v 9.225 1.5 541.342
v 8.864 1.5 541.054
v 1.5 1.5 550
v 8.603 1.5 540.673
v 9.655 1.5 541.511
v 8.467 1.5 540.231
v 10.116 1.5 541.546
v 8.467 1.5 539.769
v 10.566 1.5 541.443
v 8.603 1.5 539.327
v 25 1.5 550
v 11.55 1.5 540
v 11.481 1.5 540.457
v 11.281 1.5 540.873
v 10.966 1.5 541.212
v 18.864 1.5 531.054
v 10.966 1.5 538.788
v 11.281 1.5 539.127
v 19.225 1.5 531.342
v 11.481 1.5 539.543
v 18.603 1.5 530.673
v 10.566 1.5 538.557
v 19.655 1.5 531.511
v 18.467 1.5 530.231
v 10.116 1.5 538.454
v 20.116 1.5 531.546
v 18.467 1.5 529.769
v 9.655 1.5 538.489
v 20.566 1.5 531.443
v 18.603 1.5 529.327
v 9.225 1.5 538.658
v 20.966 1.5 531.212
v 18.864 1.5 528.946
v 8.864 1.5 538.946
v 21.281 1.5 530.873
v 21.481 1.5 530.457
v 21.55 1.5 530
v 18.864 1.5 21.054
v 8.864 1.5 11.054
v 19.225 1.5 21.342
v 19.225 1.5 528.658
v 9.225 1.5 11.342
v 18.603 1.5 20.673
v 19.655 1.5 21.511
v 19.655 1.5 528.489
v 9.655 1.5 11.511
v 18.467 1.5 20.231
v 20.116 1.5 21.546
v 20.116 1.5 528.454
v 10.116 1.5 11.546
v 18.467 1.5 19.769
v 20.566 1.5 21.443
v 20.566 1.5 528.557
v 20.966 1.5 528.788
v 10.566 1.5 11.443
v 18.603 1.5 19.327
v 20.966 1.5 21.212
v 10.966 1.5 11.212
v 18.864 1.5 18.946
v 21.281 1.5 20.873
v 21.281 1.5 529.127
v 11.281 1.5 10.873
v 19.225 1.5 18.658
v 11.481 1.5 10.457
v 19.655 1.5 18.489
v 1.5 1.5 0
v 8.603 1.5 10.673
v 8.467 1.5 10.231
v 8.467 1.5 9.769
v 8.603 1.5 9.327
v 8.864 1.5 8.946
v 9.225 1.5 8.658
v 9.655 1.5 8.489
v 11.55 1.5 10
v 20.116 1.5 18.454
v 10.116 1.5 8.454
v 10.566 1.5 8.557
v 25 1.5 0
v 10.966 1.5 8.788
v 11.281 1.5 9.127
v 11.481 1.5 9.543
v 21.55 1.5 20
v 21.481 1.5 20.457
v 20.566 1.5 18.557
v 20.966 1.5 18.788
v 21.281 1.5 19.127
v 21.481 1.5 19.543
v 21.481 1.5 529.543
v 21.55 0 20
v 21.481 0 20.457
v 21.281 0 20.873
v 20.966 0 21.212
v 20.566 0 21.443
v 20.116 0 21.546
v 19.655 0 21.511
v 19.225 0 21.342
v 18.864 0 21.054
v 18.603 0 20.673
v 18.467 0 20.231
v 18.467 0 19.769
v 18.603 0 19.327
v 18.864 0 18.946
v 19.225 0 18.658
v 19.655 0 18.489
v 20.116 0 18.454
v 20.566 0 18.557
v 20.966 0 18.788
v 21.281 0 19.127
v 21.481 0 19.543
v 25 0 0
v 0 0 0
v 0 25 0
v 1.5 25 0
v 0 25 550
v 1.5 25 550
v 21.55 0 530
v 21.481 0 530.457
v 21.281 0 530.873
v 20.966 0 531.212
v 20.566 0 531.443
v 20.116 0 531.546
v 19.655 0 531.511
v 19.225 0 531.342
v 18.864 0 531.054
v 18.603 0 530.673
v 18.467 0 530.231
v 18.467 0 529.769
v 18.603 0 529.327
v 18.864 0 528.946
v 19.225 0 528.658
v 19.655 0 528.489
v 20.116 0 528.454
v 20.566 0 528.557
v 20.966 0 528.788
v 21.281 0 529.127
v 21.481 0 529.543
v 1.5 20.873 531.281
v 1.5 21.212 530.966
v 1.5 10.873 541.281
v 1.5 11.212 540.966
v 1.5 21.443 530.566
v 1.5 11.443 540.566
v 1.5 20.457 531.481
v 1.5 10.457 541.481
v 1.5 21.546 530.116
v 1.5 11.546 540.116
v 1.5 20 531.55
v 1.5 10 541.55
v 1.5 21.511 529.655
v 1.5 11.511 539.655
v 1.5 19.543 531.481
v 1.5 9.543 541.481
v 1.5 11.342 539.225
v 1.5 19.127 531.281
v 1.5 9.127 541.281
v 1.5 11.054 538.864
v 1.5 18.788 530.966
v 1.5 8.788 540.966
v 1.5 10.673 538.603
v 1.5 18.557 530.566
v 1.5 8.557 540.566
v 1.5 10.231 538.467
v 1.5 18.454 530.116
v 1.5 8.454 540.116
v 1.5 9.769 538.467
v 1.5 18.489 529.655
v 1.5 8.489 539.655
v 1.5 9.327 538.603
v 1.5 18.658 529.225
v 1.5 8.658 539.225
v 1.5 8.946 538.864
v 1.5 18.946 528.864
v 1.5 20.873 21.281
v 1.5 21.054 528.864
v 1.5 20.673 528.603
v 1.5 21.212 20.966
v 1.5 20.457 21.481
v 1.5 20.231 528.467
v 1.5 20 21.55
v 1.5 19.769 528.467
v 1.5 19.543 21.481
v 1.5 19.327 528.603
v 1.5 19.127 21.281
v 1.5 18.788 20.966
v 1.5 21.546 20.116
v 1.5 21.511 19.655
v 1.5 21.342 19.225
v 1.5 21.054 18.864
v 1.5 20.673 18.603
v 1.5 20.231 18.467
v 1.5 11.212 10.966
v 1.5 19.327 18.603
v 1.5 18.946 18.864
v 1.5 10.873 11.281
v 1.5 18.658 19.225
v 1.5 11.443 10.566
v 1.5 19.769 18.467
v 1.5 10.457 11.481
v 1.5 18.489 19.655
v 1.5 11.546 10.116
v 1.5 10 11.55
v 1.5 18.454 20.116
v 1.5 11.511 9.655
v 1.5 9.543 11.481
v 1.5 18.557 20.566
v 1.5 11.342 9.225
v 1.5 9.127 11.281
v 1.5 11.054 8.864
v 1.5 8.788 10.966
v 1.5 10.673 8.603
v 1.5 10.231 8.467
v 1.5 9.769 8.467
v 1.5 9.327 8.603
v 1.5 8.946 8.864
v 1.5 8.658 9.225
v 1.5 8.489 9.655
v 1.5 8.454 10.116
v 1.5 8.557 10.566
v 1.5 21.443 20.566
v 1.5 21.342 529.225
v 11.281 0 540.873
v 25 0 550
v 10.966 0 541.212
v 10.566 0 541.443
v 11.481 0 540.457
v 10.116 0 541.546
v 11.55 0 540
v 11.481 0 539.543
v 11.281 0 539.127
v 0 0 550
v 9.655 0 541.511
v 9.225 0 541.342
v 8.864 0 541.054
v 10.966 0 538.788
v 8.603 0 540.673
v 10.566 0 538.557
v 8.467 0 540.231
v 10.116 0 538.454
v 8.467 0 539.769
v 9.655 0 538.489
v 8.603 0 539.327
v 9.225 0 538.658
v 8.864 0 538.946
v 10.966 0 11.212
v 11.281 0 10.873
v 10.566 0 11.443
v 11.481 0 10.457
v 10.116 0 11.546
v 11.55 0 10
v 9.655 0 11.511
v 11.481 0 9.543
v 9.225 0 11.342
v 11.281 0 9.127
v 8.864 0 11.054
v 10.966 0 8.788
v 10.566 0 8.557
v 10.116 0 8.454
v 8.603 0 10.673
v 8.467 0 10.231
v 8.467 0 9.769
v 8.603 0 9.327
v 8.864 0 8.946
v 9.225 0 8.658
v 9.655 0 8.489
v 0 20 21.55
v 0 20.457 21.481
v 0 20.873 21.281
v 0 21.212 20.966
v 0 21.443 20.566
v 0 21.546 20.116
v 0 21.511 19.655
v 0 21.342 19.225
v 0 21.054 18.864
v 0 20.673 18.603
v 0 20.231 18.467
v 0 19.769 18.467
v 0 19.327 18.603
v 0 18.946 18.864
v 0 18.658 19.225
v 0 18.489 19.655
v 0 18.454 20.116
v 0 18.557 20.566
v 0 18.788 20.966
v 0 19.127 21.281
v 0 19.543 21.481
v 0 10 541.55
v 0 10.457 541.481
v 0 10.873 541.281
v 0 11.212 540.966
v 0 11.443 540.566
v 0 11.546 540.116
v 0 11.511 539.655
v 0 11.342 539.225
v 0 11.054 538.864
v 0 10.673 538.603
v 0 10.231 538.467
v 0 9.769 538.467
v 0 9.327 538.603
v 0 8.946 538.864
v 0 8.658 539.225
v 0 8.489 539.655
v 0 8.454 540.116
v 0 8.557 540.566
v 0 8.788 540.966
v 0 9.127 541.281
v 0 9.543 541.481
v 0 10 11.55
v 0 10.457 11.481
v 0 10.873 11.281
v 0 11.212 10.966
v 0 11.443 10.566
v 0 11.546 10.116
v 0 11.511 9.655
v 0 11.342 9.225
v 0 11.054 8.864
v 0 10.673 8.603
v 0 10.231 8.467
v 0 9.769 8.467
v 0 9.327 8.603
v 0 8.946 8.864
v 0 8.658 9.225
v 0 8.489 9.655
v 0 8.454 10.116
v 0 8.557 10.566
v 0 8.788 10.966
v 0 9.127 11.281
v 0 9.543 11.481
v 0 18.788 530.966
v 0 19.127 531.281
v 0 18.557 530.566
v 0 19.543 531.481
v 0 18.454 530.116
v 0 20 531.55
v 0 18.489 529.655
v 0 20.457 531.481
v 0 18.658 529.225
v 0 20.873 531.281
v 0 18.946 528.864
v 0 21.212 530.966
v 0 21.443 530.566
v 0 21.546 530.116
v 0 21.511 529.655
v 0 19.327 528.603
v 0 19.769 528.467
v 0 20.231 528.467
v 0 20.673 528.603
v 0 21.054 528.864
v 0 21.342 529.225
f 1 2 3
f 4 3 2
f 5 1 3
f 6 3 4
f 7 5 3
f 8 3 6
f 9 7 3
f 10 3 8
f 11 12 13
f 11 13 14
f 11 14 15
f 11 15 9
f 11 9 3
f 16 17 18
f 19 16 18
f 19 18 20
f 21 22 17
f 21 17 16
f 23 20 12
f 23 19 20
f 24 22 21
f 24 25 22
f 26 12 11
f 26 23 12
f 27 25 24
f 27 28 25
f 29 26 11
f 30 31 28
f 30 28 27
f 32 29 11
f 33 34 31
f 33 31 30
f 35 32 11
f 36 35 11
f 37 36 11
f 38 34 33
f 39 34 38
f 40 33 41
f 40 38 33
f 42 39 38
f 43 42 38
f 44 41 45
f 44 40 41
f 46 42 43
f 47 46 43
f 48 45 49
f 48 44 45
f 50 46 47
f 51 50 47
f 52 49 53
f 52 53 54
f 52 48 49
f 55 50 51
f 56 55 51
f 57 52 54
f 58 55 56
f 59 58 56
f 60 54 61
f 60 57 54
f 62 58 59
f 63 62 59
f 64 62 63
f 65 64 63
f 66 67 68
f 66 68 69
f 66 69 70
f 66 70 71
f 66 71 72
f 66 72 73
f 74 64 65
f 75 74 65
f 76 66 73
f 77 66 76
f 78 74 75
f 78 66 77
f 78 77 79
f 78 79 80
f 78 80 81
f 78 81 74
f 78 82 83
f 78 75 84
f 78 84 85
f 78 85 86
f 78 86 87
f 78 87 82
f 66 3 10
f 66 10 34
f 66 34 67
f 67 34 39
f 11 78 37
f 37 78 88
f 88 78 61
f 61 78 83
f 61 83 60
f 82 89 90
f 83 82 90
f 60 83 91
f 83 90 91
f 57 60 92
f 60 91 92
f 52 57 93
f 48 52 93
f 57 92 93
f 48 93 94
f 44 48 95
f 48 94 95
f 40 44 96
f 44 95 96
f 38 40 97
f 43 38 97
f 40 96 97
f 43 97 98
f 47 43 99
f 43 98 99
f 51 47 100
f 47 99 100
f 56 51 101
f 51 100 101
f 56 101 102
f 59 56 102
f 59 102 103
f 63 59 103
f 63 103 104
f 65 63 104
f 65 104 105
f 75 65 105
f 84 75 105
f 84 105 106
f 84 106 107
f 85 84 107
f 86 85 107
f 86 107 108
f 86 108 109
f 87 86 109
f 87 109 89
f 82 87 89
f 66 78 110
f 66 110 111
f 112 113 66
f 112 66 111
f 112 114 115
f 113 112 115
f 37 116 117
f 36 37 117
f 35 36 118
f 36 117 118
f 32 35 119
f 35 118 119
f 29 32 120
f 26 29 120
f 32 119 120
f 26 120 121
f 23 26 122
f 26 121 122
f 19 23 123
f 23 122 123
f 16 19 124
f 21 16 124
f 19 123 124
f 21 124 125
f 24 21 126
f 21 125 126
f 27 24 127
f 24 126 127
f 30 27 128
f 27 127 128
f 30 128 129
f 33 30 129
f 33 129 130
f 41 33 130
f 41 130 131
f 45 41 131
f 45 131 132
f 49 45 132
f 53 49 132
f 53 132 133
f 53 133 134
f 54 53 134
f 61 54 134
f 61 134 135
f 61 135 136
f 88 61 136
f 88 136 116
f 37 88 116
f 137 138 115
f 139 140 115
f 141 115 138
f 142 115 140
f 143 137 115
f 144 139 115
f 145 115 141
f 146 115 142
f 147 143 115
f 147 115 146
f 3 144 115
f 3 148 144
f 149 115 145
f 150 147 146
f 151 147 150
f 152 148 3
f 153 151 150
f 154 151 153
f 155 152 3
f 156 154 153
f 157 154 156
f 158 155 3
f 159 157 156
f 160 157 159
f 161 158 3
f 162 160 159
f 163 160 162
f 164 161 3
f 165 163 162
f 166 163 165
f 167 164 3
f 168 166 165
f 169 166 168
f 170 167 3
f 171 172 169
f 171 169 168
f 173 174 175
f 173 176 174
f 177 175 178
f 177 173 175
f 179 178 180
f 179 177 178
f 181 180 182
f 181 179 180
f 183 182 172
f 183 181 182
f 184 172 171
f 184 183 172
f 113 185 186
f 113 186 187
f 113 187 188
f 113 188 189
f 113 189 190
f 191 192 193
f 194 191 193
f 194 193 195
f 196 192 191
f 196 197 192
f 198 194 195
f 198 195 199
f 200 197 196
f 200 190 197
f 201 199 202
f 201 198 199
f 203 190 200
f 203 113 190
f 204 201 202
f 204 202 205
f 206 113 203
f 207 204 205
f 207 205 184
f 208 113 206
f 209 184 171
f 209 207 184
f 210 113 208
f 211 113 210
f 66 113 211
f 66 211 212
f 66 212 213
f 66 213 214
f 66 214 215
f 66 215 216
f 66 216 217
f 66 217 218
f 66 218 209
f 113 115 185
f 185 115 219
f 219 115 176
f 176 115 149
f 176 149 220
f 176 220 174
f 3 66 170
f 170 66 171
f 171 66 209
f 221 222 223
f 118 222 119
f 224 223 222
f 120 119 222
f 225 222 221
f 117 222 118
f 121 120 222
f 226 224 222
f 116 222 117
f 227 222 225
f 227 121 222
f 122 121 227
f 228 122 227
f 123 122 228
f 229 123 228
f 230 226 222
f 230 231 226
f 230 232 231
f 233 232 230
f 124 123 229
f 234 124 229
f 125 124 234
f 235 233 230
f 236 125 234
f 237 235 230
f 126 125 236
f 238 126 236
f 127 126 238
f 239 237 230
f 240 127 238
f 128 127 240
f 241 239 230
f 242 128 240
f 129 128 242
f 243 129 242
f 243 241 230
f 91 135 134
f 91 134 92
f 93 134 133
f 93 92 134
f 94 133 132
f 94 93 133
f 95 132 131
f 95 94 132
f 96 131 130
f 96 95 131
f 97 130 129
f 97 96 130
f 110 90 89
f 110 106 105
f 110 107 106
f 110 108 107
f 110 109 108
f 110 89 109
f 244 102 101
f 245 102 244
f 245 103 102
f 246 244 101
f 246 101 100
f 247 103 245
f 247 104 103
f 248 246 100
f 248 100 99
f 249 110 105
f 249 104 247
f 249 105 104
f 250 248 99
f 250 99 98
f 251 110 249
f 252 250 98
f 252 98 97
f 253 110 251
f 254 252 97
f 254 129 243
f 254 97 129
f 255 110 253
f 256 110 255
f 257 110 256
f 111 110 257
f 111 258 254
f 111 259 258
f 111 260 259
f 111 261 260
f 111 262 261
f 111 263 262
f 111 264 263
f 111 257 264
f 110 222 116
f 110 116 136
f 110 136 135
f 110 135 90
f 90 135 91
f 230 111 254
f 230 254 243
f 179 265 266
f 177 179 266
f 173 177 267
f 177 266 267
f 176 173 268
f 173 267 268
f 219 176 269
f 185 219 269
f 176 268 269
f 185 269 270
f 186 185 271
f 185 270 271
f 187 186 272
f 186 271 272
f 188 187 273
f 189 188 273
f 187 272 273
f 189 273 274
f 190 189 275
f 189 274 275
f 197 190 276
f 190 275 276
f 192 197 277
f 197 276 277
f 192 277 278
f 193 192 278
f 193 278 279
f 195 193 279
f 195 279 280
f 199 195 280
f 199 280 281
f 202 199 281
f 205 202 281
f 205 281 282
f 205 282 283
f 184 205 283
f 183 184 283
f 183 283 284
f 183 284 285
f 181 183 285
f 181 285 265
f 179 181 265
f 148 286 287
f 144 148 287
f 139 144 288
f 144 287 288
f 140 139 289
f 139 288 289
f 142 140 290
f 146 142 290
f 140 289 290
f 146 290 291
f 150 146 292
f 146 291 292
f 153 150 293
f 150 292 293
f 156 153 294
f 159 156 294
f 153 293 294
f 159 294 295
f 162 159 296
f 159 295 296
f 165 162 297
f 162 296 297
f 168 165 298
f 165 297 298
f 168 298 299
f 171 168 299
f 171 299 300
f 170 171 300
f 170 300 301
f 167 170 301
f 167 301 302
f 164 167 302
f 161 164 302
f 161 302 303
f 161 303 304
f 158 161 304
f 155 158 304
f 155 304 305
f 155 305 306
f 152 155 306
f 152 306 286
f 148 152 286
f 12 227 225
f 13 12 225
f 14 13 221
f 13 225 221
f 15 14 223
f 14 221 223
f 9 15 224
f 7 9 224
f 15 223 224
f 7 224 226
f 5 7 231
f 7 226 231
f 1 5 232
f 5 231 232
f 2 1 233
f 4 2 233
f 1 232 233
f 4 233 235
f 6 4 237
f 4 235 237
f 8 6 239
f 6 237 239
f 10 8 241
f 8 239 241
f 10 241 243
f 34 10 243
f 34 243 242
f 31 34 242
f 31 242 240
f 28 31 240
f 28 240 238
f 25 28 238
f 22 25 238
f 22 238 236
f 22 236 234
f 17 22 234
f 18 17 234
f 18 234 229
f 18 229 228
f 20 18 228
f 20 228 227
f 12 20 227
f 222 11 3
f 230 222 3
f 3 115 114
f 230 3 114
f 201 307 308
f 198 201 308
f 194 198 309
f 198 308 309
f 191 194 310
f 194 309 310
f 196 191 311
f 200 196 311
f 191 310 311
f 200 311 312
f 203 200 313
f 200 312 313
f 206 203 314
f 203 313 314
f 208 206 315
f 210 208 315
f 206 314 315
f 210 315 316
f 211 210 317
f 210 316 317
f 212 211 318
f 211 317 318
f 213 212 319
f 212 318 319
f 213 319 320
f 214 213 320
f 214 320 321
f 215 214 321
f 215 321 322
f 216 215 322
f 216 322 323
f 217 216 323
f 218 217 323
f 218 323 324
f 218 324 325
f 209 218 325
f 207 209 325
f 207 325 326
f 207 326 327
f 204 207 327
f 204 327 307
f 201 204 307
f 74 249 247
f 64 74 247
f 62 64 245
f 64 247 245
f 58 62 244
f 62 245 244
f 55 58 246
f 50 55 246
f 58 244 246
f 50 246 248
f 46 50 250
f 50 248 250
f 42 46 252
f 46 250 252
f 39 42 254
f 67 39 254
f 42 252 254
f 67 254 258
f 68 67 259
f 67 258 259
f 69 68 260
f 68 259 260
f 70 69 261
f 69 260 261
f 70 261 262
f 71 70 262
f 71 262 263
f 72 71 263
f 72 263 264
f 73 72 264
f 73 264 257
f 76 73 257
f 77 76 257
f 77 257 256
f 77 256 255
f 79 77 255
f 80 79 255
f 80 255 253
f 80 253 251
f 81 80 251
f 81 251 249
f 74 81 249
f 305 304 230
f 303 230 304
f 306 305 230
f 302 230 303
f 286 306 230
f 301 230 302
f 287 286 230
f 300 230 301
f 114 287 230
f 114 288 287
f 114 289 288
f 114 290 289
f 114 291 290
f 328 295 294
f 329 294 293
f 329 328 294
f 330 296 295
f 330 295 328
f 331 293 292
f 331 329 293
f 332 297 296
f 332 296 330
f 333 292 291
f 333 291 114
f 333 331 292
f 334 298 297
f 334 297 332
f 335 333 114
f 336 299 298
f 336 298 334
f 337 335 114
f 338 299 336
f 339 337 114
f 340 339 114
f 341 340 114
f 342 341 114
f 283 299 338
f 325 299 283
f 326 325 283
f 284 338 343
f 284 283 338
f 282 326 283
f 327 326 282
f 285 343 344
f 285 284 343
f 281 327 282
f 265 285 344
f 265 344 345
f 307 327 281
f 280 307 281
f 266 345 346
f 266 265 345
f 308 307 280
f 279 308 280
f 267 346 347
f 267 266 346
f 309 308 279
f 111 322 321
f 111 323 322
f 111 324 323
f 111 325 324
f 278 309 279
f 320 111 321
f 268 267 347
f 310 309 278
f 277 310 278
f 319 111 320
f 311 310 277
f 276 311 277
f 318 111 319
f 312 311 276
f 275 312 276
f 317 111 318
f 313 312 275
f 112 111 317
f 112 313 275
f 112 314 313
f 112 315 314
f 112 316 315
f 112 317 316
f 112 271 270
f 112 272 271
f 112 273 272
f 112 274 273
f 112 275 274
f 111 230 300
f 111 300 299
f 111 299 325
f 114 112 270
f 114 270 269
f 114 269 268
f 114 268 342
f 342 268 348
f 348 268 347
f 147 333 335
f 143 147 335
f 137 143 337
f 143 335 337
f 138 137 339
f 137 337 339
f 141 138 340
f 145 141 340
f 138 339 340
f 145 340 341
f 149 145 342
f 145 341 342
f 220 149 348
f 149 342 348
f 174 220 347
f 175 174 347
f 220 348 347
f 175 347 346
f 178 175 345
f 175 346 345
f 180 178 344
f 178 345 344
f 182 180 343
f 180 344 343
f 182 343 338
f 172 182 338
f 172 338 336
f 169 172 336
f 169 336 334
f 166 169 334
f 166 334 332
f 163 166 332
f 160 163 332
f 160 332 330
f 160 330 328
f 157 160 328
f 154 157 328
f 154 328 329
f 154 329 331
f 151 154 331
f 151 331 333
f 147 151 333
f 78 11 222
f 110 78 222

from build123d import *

# Parameters (mm, degrees)
BOSS_EXTRUDE1_DEPTH = 550
SKETCH2_R           = 1.55
CUT_EXTRUDE1_DEPTH  = 10
SKETCH3_R           = 1.55
CUT_EXTRUDE2_DEPTH  = 10


with BuildPart() as part:
    # Sketch1 → Boss-Extrude1 (new body)
    with BuildSketch(Plane.XY):
        Polygon((0, 0), (0, 25), (1.5, 25), (1.5, 1.5), (25, 1.5), (25, 0), align=None)
    extrude(amount=BOSS_EXTRUDE1_DEPTH)

    # Sketch2 → Cut-Extrude1 (cut)
    with BuildSketch(Plane.ZY):
        with Locations((10, 10)):
            Circle(SKETCH2_R)
        with Locations((20, 20)):
            Circle(SKETCH2_R)
        with Locations((530, 20)):
            Circle(SKETCH2_R)
        with Locations((540, 10)):
            Circle(SKETCH2_R)
    extrude(amount=-CUT_EXTRUDE1_DEPTH, mode=Mode.SUBTRACT)

    # Sketch3 → Cut-Extrude2 (cut)
    with BuildSketch(Plane.XZ):
        with Locations((10, 540)):
            Circle(SKETCH3_R)
        with Locations((20, 530)):
            Circle(SKETCH3_R)
        with Locations((20, 20)):
            Circle(SKETCH3_R)
        with Locations((10, 10)):
            Circle(SKETCH3_R)
    extrude(amount=-CUT_EXTRUDE2_DEPTH, mode=Mode.SUBTRACT)


solid = part.part
